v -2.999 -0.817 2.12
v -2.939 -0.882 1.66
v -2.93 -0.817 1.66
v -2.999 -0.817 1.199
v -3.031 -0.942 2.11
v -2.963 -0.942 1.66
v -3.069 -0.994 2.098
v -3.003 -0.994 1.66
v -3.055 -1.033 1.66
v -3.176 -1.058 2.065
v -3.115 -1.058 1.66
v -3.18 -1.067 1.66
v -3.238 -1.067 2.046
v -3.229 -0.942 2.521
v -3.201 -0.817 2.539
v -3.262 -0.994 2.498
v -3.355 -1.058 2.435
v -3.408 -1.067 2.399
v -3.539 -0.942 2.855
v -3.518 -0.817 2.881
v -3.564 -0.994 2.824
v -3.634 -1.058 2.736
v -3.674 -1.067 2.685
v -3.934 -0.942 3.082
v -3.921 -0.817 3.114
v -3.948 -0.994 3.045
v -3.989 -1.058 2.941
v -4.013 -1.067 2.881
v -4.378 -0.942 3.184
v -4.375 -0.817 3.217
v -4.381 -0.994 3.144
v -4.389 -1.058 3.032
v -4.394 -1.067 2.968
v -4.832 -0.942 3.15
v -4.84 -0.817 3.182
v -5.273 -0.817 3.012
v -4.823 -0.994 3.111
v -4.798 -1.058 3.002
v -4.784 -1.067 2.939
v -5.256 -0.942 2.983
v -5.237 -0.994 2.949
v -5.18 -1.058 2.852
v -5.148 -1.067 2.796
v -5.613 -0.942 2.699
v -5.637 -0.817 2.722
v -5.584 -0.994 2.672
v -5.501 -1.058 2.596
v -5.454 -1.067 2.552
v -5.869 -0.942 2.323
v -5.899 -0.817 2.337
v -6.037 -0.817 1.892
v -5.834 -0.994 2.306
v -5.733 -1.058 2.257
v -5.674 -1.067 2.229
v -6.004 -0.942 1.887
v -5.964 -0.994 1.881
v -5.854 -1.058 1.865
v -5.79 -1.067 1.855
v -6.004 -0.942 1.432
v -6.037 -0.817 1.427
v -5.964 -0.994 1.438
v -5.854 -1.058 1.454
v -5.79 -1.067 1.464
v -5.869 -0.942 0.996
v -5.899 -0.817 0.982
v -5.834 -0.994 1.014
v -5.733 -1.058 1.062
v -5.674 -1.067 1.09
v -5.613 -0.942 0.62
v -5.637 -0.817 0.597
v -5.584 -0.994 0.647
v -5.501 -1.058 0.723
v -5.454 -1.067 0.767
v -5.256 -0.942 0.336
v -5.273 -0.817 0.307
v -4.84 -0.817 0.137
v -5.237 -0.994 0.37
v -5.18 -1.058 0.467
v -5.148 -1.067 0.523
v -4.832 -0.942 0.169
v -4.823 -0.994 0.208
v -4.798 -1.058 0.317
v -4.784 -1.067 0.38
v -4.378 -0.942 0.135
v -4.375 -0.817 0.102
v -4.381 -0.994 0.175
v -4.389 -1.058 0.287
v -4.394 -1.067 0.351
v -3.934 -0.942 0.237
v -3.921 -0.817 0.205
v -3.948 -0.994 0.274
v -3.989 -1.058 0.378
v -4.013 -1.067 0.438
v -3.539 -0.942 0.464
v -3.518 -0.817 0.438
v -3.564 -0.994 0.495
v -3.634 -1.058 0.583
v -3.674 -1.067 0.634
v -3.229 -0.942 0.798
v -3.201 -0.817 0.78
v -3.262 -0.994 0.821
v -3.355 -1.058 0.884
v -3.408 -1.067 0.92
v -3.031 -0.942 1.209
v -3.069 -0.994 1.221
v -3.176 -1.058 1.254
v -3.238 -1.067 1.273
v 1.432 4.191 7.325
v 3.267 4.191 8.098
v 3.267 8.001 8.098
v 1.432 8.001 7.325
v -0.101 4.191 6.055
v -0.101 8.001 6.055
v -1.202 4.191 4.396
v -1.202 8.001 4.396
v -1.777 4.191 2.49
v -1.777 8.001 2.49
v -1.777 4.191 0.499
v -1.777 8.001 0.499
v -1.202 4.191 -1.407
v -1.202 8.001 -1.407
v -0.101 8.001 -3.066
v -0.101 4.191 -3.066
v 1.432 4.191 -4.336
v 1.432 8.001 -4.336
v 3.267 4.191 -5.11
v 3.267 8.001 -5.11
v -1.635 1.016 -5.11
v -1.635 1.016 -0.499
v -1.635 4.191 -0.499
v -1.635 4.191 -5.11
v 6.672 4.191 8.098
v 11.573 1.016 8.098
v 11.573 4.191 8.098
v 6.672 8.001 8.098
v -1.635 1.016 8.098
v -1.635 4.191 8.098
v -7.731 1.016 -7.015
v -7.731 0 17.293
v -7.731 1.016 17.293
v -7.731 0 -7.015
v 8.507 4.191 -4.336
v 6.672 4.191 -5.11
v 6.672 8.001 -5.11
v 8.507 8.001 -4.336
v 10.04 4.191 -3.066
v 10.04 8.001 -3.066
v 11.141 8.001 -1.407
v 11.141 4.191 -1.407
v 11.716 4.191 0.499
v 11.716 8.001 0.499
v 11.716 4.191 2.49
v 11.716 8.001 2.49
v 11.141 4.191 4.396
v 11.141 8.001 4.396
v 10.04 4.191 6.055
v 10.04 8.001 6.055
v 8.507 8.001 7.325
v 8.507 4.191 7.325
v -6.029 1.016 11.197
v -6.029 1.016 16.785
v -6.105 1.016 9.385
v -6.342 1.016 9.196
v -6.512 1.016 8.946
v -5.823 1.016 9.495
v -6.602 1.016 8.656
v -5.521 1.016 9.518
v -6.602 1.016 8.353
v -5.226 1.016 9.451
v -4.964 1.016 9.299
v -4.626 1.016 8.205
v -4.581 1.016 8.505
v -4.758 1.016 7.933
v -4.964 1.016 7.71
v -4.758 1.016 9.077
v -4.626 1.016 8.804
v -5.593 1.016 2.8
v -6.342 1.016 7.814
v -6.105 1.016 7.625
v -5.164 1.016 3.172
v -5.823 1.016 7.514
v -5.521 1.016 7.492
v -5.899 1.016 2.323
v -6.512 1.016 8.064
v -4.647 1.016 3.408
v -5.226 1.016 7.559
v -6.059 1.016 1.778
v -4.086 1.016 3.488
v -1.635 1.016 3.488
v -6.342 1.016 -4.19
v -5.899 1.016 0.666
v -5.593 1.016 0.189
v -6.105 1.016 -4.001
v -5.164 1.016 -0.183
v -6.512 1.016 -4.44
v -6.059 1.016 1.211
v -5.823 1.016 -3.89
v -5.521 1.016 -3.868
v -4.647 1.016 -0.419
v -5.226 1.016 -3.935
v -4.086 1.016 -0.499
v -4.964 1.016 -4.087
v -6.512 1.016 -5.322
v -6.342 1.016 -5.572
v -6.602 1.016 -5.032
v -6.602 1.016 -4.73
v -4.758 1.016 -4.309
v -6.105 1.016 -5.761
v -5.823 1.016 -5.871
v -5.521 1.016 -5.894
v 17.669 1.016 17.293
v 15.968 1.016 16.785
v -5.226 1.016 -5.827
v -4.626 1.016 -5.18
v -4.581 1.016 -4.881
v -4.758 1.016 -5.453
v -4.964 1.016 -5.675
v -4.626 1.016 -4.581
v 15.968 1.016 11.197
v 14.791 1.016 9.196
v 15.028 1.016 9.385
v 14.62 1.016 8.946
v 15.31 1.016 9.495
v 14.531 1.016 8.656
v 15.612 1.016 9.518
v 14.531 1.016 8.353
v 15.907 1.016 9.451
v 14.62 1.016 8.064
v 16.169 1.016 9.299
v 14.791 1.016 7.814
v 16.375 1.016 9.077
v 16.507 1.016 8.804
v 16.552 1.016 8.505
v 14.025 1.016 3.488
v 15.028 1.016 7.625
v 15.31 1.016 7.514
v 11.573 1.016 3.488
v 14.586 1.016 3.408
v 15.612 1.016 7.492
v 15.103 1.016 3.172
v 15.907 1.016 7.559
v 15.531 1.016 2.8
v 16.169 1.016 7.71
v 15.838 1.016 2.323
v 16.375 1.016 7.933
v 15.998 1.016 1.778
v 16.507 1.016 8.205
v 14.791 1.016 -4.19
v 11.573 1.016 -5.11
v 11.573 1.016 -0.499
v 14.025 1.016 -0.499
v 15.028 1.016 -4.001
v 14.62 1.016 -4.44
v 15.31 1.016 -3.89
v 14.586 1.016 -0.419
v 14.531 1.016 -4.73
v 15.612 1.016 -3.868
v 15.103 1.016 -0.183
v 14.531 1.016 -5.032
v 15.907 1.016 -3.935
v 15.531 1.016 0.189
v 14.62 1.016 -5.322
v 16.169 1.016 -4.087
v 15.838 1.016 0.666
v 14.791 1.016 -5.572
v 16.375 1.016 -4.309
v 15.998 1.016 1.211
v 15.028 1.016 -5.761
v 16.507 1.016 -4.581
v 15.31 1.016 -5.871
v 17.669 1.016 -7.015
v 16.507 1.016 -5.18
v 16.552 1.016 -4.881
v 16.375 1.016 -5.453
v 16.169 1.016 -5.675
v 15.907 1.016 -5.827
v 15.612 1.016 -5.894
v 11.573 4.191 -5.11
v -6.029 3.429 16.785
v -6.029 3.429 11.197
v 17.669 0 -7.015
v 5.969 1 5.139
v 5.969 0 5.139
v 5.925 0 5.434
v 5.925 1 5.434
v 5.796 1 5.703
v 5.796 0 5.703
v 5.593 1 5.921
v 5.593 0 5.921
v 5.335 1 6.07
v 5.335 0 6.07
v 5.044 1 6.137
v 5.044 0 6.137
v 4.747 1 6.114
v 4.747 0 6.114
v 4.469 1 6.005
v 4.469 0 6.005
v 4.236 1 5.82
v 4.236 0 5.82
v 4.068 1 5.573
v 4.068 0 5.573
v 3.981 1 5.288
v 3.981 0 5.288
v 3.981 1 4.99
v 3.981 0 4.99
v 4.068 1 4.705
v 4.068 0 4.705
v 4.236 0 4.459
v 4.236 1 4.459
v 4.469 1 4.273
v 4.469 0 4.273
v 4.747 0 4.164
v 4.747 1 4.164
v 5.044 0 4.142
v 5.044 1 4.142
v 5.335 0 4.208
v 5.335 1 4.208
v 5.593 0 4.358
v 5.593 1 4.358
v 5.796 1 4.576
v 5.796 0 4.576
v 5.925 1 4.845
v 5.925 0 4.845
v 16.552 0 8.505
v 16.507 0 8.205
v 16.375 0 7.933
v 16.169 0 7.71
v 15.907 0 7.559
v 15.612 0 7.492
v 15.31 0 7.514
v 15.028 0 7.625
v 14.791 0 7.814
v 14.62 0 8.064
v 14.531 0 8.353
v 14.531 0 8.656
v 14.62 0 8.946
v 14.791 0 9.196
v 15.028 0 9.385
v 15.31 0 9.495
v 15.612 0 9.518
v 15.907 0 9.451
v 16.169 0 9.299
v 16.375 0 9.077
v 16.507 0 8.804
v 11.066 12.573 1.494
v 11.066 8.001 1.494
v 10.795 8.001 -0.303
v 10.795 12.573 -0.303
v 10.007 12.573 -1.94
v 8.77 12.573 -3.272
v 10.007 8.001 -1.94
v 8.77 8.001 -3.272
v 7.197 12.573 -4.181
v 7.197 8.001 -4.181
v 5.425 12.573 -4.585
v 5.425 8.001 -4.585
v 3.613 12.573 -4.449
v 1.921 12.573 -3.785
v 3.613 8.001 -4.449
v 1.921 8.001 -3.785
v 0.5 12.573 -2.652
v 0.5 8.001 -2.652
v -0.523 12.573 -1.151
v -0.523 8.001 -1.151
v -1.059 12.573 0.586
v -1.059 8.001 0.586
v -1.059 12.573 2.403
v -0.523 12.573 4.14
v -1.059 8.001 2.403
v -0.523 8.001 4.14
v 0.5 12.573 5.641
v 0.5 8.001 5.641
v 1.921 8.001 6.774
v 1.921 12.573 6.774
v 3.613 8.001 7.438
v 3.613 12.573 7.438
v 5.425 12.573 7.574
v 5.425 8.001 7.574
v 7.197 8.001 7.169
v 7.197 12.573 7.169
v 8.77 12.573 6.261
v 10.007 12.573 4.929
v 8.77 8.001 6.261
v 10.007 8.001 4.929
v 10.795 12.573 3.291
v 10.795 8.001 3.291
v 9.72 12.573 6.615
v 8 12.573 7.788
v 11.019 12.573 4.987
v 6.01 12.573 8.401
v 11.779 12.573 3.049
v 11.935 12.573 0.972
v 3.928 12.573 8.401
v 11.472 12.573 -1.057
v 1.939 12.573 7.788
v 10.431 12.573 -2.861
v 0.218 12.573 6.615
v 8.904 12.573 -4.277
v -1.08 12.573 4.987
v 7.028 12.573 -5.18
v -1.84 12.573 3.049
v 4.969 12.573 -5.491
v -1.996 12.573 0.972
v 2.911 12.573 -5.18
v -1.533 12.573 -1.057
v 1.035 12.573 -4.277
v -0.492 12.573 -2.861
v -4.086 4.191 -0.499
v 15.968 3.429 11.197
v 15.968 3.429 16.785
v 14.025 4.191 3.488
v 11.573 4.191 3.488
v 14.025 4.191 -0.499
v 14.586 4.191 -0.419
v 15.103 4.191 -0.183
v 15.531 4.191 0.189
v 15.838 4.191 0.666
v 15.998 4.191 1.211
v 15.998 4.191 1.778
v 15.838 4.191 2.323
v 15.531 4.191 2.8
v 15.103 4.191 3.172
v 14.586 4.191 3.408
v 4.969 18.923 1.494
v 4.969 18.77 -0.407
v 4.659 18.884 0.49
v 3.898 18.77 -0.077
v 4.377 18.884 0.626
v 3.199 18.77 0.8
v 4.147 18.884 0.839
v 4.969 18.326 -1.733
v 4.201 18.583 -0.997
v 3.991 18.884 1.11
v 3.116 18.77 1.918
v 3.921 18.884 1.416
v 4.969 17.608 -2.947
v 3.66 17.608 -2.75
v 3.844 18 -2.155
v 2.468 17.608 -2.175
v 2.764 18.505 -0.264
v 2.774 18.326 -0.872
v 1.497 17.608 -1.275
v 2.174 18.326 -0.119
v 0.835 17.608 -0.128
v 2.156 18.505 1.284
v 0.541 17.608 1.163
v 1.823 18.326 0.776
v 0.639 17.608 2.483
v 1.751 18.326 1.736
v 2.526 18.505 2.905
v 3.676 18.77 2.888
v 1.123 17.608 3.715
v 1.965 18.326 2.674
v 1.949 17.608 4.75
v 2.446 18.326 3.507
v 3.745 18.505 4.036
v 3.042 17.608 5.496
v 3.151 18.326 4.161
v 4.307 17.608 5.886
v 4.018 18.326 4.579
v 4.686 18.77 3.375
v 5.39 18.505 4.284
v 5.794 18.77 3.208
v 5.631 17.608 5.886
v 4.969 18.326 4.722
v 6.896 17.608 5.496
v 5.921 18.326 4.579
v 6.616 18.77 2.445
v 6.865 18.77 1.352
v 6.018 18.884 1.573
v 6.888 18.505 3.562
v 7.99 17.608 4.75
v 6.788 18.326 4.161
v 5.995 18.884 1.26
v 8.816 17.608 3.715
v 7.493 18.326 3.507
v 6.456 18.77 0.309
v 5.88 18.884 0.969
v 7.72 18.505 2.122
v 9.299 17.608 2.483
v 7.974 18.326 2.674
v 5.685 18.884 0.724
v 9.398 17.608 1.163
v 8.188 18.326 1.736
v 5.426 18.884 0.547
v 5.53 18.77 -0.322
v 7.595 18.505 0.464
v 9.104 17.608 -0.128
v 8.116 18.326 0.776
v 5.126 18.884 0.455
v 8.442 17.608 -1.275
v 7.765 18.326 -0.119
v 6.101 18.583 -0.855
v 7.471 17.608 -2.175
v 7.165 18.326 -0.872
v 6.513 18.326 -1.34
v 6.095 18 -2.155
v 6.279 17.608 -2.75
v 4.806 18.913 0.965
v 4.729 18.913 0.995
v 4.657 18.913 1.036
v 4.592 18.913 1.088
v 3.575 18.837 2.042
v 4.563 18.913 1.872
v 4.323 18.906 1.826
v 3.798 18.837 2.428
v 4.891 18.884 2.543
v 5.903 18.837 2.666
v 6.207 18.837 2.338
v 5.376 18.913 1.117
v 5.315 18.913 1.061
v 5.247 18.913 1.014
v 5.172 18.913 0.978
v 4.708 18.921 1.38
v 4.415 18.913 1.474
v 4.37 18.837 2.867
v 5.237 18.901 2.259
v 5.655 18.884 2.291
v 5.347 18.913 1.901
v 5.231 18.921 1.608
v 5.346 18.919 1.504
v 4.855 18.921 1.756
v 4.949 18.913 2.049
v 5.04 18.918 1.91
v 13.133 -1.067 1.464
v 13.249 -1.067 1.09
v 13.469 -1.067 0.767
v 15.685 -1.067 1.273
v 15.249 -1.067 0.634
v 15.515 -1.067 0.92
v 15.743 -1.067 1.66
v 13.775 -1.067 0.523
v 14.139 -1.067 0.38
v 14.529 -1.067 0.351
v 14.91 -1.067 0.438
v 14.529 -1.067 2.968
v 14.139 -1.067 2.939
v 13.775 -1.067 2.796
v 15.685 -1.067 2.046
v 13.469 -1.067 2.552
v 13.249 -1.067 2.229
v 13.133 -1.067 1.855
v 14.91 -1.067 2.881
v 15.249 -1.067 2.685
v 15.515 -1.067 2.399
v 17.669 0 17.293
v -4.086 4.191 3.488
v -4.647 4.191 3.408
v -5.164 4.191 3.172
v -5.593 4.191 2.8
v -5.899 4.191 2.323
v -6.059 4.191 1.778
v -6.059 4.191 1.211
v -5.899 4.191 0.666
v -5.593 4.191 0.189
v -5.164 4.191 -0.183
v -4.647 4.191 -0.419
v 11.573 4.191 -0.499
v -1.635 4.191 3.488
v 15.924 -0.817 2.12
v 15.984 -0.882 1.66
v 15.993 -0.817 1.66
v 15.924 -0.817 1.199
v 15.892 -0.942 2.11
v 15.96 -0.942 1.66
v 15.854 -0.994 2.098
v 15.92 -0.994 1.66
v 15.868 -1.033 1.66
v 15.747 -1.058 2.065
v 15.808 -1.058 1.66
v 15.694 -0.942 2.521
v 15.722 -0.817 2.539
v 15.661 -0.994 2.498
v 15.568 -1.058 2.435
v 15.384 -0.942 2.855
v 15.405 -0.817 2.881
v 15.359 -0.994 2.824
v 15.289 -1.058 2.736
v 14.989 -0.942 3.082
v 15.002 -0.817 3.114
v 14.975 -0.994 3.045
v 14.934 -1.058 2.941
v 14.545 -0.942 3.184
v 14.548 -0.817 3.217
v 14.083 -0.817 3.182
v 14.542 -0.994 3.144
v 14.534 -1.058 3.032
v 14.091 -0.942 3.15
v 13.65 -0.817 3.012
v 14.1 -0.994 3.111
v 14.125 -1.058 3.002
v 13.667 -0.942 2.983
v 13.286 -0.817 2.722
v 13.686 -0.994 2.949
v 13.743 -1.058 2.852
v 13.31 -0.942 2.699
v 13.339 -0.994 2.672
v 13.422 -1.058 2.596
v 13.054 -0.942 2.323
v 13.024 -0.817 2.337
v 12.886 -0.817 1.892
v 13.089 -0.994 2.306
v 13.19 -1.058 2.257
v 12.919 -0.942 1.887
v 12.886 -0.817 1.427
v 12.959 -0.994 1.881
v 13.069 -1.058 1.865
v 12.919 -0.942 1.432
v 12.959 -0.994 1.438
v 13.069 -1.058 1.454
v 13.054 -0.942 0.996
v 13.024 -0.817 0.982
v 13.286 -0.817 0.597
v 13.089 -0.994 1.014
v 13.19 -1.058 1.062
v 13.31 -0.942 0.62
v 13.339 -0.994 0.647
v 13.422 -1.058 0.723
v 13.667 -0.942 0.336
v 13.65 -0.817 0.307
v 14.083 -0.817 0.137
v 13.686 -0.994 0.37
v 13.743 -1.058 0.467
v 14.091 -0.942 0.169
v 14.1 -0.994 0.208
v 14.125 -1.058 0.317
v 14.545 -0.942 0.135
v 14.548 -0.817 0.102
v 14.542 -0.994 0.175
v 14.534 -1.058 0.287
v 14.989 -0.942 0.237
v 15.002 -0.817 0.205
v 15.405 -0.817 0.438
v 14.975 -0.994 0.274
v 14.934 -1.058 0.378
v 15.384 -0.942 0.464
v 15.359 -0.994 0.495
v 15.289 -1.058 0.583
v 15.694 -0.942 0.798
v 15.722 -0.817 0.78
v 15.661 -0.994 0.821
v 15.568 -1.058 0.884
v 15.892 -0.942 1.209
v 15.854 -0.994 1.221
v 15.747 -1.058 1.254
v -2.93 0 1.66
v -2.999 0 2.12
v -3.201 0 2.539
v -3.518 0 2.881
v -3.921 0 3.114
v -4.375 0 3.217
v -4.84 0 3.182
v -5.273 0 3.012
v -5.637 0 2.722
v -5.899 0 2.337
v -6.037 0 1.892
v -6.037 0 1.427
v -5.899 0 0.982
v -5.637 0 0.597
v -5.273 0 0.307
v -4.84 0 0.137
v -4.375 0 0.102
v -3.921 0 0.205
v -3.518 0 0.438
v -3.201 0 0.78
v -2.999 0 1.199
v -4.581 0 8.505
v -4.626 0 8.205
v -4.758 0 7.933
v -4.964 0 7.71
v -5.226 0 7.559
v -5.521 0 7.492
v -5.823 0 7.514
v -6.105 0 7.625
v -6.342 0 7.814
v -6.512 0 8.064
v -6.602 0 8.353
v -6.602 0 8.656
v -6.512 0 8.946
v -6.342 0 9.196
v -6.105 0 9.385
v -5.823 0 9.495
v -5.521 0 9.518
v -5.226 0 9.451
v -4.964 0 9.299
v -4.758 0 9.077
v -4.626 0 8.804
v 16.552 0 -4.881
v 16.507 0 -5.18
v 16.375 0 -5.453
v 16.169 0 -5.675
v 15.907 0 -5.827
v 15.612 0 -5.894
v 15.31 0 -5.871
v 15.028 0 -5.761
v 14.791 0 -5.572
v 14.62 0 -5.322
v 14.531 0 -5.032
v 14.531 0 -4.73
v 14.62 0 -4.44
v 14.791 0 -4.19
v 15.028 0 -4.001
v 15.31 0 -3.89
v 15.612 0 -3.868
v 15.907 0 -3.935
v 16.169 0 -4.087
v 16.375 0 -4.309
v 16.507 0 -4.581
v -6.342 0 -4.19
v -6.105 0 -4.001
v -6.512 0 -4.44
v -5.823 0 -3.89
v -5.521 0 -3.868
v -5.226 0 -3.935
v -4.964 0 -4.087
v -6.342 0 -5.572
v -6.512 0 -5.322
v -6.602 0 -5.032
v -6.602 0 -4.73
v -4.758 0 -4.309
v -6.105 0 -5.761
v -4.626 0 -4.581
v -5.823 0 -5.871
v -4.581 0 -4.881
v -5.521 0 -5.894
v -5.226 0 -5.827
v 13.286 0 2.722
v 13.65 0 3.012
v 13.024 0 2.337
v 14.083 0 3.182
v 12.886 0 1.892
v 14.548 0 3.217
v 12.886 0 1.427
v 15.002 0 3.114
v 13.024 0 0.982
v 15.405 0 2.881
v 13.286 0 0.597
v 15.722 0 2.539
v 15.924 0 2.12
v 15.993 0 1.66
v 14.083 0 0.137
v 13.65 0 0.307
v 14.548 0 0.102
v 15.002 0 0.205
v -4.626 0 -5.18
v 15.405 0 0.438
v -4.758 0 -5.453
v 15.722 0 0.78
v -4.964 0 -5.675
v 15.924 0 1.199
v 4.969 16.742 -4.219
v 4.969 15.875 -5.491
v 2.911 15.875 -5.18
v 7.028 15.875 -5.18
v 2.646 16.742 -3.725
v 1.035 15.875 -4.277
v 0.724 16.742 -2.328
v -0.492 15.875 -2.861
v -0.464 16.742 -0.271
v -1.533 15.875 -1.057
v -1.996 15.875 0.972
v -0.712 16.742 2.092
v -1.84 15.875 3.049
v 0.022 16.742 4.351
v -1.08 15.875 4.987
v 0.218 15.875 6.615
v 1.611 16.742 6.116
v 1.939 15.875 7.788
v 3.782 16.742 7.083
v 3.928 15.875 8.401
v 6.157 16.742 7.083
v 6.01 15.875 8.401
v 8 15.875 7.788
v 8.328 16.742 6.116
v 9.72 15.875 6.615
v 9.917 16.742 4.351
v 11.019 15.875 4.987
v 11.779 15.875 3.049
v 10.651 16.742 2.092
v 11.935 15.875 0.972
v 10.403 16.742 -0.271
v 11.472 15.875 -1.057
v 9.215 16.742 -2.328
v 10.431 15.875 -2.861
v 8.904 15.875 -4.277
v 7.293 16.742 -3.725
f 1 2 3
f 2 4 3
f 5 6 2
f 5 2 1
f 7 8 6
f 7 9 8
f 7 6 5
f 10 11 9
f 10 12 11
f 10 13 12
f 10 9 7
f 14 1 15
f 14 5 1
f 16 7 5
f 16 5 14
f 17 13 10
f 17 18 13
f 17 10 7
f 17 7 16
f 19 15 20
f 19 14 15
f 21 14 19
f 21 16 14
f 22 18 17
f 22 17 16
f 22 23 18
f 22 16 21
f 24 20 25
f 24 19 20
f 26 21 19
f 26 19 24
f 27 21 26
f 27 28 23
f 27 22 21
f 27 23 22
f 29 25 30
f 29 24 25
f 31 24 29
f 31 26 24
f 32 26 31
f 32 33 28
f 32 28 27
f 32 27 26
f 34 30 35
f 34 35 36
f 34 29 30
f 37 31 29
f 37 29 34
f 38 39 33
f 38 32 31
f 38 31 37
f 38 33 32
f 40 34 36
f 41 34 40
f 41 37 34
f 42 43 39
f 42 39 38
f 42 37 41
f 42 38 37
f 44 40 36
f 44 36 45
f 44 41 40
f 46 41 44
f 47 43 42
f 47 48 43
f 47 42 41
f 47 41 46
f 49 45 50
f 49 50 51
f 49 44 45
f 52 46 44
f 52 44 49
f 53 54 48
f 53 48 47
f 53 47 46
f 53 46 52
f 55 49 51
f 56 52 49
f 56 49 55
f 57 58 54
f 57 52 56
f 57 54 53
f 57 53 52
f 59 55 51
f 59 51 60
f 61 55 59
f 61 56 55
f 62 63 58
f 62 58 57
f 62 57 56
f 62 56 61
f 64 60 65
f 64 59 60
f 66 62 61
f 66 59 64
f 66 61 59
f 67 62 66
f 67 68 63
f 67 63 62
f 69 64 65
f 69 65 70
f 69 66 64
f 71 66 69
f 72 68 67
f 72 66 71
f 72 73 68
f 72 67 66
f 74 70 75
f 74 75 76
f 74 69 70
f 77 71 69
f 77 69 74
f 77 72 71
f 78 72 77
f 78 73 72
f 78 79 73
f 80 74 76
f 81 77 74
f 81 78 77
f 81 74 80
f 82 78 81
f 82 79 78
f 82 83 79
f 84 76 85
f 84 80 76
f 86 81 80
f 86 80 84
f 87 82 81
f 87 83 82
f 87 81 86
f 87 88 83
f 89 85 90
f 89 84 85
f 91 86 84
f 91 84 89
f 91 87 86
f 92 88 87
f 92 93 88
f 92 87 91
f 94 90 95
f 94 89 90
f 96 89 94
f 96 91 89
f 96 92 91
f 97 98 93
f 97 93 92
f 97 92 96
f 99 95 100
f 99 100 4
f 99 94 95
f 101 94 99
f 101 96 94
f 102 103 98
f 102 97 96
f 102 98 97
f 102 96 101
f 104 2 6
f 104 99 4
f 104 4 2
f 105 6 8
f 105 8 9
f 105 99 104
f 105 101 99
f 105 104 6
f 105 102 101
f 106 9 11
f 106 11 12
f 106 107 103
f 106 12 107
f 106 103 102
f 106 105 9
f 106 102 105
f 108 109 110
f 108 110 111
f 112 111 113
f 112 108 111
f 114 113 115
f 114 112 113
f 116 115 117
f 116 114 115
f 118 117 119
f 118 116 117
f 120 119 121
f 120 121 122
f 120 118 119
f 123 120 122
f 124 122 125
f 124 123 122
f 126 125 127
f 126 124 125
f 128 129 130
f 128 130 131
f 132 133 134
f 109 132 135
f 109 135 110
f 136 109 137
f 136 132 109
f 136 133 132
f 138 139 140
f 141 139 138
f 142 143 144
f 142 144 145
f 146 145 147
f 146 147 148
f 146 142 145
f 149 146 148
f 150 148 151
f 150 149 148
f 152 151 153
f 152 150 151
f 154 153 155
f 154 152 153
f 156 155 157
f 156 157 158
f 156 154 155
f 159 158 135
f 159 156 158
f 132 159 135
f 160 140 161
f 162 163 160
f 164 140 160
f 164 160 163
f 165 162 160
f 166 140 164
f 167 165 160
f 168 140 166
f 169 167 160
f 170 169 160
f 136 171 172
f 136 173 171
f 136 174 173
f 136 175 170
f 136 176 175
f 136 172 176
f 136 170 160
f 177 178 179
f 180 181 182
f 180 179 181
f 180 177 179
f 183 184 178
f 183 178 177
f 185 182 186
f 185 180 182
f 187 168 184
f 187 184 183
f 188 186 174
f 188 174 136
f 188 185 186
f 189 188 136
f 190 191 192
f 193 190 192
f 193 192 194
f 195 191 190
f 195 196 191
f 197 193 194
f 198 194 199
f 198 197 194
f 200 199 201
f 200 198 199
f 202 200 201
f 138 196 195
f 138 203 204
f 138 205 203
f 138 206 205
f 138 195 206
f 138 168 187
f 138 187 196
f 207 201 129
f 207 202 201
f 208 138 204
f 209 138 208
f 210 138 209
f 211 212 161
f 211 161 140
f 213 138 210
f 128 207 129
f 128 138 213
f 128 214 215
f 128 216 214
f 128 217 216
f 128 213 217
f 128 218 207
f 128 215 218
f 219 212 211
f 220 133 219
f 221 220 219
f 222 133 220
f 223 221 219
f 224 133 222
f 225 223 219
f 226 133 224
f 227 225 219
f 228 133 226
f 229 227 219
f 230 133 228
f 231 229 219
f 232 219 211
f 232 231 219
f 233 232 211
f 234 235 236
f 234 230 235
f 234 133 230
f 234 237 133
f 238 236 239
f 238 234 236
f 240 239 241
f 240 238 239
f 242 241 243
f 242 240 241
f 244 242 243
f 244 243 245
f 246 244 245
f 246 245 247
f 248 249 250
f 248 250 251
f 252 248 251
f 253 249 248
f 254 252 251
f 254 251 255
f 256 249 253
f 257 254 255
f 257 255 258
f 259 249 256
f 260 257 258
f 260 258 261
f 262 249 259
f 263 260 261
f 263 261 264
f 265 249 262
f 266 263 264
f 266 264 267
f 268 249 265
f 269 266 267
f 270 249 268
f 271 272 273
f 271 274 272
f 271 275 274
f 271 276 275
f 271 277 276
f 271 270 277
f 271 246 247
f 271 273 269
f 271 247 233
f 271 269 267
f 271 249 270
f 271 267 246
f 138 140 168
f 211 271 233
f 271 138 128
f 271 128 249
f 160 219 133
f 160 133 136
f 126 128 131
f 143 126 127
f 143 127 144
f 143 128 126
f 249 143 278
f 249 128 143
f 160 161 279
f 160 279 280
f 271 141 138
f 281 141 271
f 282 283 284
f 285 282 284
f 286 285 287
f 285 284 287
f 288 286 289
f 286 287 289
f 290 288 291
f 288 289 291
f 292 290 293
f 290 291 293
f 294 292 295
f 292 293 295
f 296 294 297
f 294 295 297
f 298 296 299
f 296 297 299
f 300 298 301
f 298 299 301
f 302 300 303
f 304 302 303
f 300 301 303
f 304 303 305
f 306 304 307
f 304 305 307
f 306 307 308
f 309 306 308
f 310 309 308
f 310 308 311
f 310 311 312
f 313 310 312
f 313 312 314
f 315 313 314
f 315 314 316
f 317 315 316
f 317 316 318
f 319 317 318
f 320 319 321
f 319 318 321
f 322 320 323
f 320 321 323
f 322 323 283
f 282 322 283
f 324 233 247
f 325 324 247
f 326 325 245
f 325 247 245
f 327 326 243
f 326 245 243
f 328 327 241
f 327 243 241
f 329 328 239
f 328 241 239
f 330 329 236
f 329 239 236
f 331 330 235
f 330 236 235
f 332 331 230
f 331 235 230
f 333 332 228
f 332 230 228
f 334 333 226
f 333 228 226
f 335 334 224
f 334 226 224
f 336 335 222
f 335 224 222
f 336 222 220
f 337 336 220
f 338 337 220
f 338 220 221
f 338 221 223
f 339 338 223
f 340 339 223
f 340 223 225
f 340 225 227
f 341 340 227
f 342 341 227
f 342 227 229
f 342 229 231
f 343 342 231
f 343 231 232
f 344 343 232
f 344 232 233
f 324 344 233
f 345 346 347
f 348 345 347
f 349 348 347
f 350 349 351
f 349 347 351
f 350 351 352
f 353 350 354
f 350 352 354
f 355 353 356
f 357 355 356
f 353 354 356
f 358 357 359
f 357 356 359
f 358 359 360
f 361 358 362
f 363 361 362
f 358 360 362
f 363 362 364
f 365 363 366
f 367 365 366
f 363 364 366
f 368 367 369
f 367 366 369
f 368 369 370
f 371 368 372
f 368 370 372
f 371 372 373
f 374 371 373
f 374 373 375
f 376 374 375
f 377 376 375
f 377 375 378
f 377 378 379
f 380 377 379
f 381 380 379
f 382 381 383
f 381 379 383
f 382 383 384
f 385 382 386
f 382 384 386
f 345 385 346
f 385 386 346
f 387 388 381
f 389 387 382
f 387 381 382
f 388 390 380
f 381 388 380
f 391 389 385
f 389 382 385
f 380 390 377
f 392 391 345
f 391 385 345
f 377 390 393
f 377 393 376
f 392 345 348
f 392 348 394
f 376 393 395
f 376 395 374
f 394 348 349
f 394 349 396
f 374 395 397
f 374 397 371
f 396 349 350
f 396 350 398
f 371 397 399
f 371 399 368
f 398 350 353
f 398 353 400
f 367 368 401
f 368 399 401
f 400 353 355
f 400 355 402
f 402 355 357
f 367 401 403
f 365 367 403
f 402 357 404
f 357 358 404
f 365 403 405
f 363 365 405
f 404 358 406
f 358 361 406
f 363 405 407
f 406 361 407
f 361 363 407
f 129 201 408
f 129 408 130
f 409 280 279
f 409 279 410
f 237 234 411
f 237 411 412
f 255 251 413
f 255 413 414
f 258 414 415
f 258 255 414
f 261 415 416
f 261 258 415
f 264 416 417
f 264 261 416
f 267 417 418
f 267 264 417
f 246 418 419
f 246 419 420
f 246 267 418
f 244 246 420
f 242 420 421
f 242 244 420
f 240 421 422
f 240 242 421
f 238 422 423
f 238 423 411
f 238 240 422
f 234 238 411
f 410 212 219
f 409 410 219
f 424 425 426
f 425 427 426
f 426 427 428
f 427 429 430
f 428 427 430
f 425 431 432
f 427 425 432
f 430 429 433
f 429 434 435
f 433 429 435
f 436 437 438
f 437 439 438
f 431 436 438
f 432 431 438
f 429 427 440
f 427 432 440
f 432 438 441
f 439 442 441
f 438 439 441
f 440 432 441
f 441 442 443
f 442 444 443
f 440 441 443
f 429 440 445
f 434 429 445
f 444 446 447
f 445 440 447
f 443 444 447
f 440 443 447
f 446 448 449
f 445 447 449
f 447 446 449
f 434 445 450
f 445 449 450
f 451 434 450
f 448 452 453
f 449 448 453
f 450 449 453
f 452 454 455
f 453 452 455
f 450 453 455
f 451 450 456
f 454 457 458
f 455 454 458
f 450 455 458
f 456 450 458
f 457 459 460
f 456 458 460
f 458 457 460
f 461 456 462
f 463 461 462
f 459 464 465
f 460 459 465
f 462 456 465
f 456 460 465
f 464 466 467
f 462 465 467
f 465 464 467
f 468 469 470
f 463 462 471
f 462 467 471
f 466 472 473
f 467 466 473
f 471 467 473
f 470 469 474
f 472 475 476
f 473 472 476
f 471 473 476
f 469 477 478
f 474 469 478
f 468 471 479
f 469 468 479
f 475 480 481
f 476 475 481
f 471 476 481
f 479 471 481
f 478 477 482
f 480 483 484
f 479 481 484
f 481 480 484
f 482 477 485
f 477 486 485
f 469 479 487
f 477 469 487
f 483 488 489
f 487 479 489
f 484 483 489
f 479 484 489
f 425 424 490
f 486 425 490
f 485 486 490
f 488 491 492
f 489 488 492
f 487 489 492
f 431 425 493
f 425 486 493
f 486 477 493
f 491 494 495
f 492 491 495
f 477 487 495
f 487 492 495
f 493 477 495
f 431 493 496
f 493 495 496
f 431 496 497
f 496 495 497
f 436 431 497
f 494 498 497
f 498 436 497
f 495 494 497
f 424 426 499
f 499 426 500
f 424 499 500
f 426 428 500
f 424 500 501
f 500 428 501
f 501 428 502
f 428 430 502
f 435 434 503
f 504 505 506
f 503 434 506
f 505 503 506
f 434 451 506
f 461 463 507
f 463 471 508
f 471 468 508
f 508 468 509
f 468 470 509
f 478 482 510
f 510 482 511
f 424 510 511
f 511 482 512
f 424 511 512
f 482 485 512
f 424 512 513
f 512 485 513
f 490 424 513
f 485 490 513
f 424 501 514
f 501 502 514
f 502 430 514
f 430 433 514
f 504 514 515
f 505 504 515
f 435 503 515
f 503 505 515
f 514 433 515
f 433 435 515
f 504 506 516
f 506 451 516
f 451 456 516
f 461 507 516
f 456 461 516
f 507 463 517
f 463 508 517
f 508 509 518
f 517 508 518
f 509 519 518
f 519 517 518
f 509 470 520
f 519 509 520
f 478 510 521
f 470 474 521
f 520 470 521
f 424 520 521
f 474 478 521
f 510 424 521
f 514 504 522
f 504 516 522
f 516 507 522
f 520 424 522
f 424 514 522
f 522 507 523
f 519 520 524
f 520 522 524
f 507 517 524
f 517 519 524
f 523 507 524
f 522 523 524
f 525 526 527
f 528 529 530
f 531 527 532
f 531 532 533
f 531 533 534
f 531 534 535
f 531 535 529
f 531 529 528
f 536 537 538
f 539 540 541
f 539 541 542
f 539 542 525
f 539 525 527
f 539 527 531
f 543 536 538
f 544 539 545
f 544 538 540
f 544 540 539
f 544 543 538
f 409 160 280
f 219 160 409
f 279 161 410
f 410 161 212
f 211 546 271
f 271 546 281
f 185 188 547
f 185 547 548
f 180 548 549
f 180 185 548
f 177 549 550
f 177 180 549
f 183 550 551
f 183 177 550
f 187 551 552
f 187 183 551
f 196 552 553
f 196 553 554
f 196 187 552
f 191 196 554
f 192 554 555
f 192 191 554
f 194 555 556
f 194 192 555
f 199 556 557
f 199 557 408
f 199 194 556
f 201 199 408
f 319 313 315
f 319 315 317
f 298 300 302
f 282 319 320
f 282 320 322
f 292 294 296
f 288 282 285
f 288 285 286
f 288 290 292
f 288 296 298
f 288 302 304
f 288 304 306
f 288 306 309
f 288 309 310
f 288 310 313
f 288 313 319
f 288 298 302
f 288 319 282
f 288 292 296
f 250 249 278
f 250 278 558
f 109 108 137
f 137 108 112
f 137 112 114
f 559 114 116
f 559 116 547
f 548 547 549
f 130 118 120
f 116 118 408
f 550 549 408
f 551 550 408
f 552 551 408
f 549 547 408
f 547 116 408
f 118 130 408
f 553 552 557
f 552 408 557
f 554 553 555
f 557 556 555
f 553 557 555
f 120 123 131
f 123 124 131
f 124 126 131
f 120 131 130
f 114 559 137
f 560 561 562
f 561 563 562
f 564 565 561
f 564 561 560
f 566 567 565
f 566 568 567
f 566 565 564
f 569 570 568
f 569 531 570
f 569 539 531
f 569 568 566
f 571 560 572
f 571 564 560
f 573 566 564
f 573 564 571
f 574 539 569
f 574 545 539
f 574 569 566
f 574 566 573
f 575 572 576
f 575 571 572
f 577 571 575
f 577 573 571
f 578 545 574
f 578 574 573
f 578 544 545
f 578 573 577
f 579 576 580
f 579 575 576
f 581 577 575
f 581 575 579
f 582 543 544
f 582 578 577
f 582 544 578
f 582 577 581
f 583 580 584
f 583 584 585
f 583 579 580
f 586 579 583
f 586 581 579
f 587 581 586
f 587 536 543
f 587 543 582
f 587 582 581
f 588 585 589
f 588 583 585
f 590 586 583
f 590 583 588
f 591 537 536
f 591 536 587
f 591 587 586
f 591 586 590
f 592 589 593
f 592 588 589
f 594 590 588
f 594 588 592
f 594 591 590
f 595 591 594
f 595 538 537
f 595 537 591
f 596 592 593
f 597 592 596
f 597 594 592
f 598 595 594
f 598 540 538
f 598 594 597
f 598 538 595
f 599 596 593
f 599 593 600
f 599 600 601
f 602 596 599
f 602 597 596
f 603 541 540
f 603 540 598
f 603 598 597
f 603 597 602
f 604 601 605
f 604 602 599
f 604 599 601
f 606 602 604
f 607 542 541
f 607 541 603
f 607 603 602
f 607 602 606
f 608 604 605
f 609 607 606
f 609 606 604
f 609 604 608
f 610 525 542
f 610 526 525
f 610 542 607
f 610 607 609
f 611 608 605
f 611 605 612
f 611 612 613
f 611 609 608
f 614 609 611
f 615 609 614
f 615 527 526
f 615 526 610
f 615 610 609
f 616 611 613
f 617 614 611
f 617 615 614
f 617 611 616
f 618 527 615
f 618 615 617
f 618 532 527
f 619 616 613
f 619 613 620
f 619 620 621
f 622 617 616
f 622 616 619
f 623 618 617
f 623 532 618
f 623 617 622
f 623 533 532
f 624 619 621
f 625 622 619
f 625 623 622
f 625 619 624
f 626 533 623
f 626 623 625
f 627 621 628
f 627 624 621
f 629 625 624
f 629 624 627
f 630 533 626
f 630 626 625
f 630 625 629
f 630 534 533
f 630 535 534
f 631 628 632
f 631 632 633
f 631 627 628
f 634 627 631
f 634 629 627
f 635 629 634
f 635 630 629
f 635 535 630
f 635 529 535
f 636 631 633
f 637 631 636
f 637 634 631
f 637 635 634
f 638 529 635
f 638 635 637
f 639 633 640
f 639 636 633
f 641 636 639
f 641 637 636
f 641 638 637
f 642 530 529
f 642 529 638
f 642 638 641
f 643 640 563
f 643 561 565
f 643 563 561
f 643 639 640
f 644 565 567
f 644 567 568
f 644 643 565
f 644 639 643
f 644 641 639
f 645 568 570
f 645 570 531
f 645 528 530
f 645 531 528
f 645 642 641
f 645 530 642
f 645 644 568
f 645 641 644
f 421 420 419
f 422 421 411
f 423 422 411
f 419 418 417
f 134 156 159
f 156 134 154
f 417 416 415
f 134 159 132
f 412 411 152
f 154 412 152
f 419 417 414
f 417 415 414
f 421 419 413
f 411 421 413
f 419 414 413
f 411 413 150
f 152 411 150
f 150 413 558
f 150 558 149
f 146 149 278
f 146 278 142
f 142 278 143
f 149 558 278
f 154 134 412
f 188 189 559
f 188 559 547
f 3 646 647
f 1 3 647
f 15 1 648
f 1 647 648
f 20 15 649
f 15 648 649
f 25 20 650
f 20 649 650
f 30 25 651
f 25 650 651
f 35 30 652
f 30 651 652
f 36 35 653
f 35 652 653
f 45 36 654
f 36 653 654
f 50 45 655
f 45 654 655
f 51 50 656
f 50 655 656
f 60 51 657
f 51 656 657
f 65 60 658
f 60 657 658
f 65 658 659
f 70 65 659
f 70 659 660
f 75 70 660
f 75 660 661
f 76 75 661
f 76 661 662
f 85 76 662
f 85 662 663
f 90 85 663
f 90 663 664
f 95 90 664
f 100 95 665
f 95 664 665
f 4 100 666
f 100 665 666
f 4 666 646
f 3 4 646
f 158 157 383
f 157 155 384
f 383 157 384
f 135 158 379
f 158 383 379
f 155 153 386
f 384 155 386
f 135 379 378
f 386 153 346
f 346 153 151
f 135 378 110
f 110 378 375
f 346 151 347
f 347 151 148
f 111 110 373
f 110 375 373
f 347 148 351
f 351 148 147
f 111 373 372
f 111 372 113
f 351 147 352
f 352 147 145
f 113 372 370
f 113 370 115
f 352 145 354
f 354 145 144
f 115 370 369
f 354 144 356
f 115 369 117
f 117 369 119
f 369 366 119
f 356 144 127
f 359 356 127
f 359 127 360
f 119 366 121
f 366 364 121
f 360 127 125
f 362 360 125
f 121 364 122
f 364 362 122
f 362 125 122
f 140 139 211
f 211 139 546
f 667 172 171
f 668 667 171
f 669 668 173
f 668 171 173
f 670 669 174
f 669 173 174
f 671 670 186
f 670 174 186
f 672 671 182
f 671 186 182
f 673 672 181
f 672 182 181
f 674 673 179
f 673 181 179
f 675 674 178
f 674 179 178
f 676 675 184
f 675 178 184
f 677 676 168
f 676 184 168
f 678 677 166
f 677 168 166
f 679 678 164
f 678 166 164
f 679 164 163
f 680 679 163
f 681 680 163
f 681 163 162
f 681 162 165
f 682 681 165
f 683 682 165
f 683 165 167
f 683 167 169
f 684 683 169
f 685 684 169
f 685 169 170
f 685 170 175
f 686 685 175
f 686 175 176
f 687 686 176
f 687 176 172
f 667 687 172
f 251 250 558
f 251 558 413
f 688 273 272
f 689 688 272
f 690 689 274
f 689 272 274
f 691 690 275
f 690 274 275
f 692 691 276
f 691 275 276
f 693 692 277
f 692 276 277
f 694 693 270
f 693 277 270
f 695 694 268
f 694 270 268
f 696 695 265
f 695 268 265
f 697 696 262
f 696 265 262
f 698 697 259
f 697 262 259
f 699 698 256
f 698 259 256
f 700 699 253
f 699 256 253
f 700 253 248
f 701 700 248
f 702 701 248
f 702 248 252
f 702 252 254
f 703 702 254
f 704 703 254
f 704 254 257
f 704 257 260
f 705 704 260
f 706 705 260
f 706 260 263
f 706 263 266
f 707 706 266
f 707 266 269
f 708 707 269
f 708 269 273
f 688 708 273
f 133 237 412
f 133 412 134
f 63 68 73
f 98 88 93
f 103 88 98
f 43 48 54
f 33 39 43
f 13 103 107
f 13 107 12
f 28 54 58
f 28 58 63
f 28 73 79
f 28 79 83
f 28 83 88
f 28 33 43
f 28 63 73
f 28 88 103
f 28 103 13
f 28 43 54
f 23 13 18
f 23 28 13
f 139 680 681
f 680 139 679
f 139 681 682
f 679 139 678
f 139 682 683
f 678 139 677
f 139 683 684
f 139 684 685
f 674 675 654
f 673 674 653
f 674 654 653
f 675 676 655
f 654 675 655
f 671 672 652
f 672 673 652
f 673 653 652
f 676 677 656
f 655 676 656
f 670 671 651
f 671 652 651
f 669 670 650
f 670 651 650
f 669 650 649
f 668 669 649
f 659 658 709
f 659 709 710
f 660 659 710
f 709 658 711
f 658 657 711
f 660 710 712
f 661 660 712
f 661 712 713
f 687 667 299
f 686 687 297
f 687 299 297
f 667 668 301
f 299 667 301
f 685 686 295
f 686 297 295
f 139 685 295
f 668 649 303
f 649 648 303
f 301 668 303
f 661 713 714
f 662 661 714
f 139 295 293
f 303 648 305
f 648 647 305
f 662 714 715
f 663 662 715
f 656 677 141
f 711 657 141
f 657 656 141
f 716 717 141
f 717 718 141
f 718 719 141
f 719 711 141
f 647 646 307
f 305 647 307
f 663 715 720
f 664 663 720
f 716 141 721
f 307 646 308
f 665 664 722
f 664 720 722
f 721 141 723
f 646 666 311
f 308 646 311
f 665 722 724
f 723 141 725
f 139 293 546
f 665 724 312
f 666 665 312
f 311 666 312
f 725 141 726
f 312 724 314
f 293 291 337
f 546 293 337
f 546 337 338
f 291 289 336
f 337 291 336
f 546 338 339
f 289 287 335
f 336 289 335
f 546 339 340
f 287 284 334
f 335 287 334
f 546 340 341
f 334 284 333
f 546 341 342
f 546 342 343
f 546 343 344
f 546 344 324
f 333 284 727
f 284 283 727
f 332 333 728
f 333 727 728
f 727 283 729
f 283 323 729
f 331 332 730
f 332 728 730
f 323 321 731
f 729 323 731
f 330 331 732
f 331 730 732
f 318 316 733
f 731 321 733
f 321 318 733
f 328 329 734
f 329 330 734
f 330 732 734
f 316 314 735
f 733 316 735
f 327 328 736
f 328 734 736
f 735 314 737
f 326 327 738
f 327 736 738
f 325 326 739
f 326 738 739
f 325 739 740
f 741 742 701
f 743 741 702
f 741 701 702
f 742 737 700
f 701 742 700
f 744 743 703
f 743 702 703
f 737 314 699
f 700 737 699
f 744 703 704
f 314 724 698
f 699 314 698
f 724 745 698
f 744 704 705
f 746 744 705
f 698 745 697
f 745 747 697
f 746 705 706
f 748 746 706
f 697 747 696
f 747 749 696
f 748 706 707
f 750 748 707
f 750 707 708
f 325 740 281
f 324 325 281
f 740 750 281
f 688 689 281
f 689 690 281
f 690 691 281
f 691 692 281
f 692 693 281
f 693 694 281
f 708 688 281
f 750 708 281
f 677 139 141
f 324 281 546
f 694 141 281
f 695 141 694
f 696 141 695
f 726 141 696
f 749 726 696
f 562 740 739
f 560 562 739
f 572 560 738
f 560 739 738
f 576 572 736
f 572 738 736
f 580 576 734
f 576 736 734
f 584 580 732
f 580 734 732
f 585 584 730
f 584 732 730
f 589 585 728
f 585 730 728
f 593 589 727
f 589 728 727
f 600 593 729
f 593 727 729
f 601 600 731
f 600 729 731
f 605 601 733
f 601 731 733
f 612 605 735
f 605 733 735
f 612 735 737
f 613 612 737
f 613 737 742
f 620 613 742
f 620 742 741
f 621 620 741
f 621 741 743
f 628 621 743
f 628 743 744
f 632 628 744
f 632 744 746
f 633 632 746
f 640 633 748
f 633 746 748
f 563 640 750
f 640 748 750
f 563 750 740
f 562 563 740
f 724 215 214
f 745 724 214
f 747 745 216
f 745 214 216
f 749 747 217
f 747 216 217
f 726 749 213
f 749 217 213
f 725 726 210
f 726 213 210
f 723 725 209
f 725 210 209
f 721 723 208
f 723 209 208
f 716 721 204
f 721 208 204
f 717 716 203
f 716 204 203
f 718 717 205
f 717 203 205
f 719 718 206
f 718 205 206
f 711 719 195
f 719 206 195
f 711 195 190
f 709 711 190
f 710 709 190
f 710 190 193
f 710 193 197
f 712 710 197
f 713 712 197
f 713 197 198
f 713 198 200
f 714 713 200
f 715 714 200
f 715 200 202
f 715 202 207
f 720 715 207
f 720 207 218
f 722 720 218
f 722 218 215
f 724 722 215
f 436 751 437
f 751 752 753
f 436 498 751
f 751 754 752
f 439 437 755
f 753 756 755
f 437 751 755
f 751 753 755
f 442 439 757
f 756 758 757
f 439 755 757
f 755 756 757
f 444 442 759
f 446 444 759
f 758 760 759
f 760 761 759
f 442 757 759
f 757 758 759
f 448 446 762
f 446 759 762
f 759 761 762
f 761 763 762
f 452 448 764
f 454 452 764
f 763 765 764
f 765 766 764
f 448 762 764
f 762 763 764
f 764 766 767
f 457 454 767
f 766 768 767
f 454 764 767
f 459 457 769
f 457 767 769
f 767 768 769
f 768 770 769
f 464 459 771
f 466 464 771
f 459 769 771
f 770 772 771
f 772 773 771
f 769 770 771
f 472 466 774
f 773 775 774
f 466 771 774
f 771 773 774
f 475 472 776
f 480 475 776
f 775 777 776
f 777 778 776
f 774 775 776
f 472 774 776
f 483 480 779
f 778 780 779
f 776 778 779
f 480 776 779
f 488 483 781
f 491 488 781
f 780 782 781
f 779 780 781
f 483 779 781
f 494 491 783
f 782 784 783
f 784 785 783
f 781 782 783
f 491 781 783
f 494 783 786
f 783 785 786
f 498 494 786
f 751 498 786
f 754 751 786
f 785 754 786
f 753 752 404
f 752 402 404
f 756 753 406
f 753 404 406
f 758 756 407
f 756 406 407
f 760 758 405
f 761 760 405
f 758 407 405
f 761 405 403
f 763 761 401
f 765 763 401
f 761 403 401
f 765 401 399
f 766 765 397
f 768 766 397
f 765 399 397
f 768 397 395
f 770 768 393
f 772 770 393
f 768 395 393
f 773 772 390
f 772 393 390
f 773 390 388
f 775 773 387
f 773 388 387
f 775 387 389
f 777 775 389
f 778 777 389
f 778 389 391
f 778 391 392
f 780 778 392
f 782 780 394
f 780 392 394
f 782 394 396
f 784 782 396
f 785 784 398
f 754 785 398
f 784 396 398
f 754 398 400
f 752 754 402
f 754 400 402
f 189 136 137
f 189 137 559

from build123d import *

# Parameters (mm, degrees)
SKETCH1_W           = 25.4
SKETCH1_H           = 24.3078
BOSS_EXTRUDE1_DEPTH = 1.016
SKETCH2_R           = 1.016
CUT_EXTRUDE1_DEPTH  = 10
SKETCH3_W           = 21.9964
SKETCH3_H           = 5.588
BOSS_EXTRUDE2_DEPTH = 2.413
BOSS_EXTRUDE3_DEPTH = 3.175
BOSS_EXTRUDE4_DEPTH = 3.81
SKETCH6_R           = 6.096408591
BOSS_EXTRUDE5_DEPTH = 4.572
SKETCH9_R           = 1.5621
BOSS_EXTRUDE6_DEPTH = 1.0668
FILLET1_R           = 0.25
SKETCH10_R          = 1
CUT_EXTRUDE2_DEPTH  = 1


with BuildPart() as part:
    # Sketch1 → Boss-Extrude1 (new body)
    with BuildSketch(Plane(origin=(0, 0, 0), x_dir=(1, 0, 0), z_dir=(0, 1, 0))):
        with Locations((4.969417476, -5.139336893)):
            Rectangle(SKETCH1_W, SKETCH1_H)
    extrude(amount=BOSS_EXTRUDE1_DEPTH)

    # Sketch2 → Cut-Extrude1 (cut)
    with BuildSketch(Plane(origin=(0, 1.016, 0), x_dir=(1, 0, 0), z_dir=(0, 1, 0))):
        with Locations((-5.596982524, 4.880963107)):
            Circle(SKETCH2_R)
        with Locations((-5.596982524, -8.504836893)):
            Circle(SKETCH2_R)
        with Locations((15.535817476, 4.880963107)):
            Circle(SKETCH2_R)
        with Locations((15.535817476, -8.504836893)):
            Circle(SKETCH2_R)
    extrude(amount=-CUT_EXTRUDE1_DEPTH, mode=Mode.SUBTRACT)

    # Sketch3 → Boss-Extrude2 (add)
    with BuildSketch(Plane(origin=(0, 1.016, 0), x_dir=(1, 0, 0), z_dir=(0, 1, 0))):
        with Locations((4.969417476, -13.991236893)):
            Rectangle(SKETCH3_W, SKETCH3_H)
    extrude(amount=BOSS_EXTRUDE2_DEPTH)

    # Sketch4 → Boss-Extrude3 (add)
    with BuildSketch(Plane(origin=(0, 1.016, 0), x_dir=(1, 0, 0), z_dir=(0, 1, 0))):
        with BuildLine():
            Line((-1.634582524, 5.109563107), (11.573417476, 5.109563107))
            Line((11.573417476, 5.109563107), (11.573417476, 0.499463107))
            Line((11.573417476, 0.499463107), (14.024517476, 0.499463107))
            ThreePointArc((14.024517476, 0.499463107), (16.018417476, -1.494436893), (14.024517476, -3.488336893))
            Line((14.024517476, -3.488336893), (11.573417476, -3.488336893))
            Line((11.573417476, -3.488336893), (11.573417476, -8.098436893))
            Line((11.573417476, -8.098436893), (-1.634582524, -8.098436893))
            Line((-1.634582524, -8.098436893), (-1.634582524, -3.488336893))
            Line((-1.634582524, -3.488336893), (-4.085682524, -3.488336893))
            ThreePointArc((-4.085682524, -3.488336893), (-6.079582524, -1.494436893), (-4.085682524, 0.499463107))
            Line((-4.085682524, 0.499463107), (-1.634582524, 0.499463107))
            Line((-1.634582524, 0.499463107), (-1.634582524, 5.109563107))
        make_face()
    extrude(amount=BOSS_EXTRUDE3_DEPTH)

    # Sketch5 → Boss-Extrude4 (add)
    with BuildSketch(Plane(origin=(0, 4.191, 0), x_dir=(1, 0, 0), z_dir=(0, 1, 0))):
        with BuildLine():
            Line((6.671833409, -8.098436893), (3.267001542, -8.098436893))
            ThreePointArc((3.267001542, -8.098436893), (-1.850482524, -1.494436893), (3.267001542, 5.109563107))
            Line((3.267001542, 5.109563107), (4.969417476, 5.109563107))
            Line((4.969417476, 5.109563107), (6.671833409, 5.109563107))
            ThreePointArc((6.671833409, 5.109563107), (11.789317476, -1.494436893), (6.671833409, -8.098436893))
        make_face()
    extrude(amount=BOSS_EXTRUDE4_DEPTH)

    # Sketch6 → Boss-Extrude5 (add)
    with BuildSketch(Plane(origin=(0, 8.001, 0), x_dir=(1, 0, 0), z_dir=(0, 1, 0))):
        with Locations((4.969417476, -1.494436893)):
            Circle(SKETCH6_R)
    extrude(amount=BOSS_EXTRUDE5_DEPTH)

    # Sketch8 → Revolve1 (revolve)
    with BuildSketch(Plane(origin=(4.969417476, 12.573, 1.494436893), x_dir=(0, 0, 1), z_dir=(-1, 0, 0))):
        with BuildLine():
            Line((-4.44130706, 5.035394986), (-6.985, 3.302))
            Line((-6.985, 3.302), (-6.985, 0))
            Line((-6.985, 0), (0, 0))
            Line((0, 0), (0, 6.35))
            add(Edge.make_bspline(
                [(0, 6.35), (-2.343173103, 6.35), (-3.129648943, 5.88240785), (-4.44130706, 5.035394986)],
                knots=[0, 0, 0, 0, 1, 1, 1, 1], degree=3))
        make_face()
    revolve(axis=Axis((4.969417476, 12.573, 1.494436893), (0, 1, 0)))

    # Sketch9 → Boss-Extrude6 (add)
    with BuildSketch(Plane.XZ):
        with Locations((14.430917476, 1.659536893)):
            Circle(SKETCH9_R)
        with Locations((-4.492082524, 1.659536893)):
            Circle(SKETCH9_R)
    extrude(amount=BOSS_EXTRUDE6_DEPTH)

    # Fillet1
    fillet1_edges = [part.edges().sort_by_distance(p)[0] for p in [
        (12.868817476, -1.0668, 1.659536893),
        (-6.054182524, -1.0668, 1.659536893),
    ]]
    fillet(fillet1_edges, radius=FILLET1_R)

    # Sketch10 → Cut-Extrude2 (cut)
    with BuildSketch(Plane.XZ):
        with Locations((4.969417476, 5.139336893)):
            Circle(SKETCH10_R)
    extrude(amount=-CUT_EXTRUDE2_DEPTH, mode=Mode.SUBTRACT)


solid = part.part
